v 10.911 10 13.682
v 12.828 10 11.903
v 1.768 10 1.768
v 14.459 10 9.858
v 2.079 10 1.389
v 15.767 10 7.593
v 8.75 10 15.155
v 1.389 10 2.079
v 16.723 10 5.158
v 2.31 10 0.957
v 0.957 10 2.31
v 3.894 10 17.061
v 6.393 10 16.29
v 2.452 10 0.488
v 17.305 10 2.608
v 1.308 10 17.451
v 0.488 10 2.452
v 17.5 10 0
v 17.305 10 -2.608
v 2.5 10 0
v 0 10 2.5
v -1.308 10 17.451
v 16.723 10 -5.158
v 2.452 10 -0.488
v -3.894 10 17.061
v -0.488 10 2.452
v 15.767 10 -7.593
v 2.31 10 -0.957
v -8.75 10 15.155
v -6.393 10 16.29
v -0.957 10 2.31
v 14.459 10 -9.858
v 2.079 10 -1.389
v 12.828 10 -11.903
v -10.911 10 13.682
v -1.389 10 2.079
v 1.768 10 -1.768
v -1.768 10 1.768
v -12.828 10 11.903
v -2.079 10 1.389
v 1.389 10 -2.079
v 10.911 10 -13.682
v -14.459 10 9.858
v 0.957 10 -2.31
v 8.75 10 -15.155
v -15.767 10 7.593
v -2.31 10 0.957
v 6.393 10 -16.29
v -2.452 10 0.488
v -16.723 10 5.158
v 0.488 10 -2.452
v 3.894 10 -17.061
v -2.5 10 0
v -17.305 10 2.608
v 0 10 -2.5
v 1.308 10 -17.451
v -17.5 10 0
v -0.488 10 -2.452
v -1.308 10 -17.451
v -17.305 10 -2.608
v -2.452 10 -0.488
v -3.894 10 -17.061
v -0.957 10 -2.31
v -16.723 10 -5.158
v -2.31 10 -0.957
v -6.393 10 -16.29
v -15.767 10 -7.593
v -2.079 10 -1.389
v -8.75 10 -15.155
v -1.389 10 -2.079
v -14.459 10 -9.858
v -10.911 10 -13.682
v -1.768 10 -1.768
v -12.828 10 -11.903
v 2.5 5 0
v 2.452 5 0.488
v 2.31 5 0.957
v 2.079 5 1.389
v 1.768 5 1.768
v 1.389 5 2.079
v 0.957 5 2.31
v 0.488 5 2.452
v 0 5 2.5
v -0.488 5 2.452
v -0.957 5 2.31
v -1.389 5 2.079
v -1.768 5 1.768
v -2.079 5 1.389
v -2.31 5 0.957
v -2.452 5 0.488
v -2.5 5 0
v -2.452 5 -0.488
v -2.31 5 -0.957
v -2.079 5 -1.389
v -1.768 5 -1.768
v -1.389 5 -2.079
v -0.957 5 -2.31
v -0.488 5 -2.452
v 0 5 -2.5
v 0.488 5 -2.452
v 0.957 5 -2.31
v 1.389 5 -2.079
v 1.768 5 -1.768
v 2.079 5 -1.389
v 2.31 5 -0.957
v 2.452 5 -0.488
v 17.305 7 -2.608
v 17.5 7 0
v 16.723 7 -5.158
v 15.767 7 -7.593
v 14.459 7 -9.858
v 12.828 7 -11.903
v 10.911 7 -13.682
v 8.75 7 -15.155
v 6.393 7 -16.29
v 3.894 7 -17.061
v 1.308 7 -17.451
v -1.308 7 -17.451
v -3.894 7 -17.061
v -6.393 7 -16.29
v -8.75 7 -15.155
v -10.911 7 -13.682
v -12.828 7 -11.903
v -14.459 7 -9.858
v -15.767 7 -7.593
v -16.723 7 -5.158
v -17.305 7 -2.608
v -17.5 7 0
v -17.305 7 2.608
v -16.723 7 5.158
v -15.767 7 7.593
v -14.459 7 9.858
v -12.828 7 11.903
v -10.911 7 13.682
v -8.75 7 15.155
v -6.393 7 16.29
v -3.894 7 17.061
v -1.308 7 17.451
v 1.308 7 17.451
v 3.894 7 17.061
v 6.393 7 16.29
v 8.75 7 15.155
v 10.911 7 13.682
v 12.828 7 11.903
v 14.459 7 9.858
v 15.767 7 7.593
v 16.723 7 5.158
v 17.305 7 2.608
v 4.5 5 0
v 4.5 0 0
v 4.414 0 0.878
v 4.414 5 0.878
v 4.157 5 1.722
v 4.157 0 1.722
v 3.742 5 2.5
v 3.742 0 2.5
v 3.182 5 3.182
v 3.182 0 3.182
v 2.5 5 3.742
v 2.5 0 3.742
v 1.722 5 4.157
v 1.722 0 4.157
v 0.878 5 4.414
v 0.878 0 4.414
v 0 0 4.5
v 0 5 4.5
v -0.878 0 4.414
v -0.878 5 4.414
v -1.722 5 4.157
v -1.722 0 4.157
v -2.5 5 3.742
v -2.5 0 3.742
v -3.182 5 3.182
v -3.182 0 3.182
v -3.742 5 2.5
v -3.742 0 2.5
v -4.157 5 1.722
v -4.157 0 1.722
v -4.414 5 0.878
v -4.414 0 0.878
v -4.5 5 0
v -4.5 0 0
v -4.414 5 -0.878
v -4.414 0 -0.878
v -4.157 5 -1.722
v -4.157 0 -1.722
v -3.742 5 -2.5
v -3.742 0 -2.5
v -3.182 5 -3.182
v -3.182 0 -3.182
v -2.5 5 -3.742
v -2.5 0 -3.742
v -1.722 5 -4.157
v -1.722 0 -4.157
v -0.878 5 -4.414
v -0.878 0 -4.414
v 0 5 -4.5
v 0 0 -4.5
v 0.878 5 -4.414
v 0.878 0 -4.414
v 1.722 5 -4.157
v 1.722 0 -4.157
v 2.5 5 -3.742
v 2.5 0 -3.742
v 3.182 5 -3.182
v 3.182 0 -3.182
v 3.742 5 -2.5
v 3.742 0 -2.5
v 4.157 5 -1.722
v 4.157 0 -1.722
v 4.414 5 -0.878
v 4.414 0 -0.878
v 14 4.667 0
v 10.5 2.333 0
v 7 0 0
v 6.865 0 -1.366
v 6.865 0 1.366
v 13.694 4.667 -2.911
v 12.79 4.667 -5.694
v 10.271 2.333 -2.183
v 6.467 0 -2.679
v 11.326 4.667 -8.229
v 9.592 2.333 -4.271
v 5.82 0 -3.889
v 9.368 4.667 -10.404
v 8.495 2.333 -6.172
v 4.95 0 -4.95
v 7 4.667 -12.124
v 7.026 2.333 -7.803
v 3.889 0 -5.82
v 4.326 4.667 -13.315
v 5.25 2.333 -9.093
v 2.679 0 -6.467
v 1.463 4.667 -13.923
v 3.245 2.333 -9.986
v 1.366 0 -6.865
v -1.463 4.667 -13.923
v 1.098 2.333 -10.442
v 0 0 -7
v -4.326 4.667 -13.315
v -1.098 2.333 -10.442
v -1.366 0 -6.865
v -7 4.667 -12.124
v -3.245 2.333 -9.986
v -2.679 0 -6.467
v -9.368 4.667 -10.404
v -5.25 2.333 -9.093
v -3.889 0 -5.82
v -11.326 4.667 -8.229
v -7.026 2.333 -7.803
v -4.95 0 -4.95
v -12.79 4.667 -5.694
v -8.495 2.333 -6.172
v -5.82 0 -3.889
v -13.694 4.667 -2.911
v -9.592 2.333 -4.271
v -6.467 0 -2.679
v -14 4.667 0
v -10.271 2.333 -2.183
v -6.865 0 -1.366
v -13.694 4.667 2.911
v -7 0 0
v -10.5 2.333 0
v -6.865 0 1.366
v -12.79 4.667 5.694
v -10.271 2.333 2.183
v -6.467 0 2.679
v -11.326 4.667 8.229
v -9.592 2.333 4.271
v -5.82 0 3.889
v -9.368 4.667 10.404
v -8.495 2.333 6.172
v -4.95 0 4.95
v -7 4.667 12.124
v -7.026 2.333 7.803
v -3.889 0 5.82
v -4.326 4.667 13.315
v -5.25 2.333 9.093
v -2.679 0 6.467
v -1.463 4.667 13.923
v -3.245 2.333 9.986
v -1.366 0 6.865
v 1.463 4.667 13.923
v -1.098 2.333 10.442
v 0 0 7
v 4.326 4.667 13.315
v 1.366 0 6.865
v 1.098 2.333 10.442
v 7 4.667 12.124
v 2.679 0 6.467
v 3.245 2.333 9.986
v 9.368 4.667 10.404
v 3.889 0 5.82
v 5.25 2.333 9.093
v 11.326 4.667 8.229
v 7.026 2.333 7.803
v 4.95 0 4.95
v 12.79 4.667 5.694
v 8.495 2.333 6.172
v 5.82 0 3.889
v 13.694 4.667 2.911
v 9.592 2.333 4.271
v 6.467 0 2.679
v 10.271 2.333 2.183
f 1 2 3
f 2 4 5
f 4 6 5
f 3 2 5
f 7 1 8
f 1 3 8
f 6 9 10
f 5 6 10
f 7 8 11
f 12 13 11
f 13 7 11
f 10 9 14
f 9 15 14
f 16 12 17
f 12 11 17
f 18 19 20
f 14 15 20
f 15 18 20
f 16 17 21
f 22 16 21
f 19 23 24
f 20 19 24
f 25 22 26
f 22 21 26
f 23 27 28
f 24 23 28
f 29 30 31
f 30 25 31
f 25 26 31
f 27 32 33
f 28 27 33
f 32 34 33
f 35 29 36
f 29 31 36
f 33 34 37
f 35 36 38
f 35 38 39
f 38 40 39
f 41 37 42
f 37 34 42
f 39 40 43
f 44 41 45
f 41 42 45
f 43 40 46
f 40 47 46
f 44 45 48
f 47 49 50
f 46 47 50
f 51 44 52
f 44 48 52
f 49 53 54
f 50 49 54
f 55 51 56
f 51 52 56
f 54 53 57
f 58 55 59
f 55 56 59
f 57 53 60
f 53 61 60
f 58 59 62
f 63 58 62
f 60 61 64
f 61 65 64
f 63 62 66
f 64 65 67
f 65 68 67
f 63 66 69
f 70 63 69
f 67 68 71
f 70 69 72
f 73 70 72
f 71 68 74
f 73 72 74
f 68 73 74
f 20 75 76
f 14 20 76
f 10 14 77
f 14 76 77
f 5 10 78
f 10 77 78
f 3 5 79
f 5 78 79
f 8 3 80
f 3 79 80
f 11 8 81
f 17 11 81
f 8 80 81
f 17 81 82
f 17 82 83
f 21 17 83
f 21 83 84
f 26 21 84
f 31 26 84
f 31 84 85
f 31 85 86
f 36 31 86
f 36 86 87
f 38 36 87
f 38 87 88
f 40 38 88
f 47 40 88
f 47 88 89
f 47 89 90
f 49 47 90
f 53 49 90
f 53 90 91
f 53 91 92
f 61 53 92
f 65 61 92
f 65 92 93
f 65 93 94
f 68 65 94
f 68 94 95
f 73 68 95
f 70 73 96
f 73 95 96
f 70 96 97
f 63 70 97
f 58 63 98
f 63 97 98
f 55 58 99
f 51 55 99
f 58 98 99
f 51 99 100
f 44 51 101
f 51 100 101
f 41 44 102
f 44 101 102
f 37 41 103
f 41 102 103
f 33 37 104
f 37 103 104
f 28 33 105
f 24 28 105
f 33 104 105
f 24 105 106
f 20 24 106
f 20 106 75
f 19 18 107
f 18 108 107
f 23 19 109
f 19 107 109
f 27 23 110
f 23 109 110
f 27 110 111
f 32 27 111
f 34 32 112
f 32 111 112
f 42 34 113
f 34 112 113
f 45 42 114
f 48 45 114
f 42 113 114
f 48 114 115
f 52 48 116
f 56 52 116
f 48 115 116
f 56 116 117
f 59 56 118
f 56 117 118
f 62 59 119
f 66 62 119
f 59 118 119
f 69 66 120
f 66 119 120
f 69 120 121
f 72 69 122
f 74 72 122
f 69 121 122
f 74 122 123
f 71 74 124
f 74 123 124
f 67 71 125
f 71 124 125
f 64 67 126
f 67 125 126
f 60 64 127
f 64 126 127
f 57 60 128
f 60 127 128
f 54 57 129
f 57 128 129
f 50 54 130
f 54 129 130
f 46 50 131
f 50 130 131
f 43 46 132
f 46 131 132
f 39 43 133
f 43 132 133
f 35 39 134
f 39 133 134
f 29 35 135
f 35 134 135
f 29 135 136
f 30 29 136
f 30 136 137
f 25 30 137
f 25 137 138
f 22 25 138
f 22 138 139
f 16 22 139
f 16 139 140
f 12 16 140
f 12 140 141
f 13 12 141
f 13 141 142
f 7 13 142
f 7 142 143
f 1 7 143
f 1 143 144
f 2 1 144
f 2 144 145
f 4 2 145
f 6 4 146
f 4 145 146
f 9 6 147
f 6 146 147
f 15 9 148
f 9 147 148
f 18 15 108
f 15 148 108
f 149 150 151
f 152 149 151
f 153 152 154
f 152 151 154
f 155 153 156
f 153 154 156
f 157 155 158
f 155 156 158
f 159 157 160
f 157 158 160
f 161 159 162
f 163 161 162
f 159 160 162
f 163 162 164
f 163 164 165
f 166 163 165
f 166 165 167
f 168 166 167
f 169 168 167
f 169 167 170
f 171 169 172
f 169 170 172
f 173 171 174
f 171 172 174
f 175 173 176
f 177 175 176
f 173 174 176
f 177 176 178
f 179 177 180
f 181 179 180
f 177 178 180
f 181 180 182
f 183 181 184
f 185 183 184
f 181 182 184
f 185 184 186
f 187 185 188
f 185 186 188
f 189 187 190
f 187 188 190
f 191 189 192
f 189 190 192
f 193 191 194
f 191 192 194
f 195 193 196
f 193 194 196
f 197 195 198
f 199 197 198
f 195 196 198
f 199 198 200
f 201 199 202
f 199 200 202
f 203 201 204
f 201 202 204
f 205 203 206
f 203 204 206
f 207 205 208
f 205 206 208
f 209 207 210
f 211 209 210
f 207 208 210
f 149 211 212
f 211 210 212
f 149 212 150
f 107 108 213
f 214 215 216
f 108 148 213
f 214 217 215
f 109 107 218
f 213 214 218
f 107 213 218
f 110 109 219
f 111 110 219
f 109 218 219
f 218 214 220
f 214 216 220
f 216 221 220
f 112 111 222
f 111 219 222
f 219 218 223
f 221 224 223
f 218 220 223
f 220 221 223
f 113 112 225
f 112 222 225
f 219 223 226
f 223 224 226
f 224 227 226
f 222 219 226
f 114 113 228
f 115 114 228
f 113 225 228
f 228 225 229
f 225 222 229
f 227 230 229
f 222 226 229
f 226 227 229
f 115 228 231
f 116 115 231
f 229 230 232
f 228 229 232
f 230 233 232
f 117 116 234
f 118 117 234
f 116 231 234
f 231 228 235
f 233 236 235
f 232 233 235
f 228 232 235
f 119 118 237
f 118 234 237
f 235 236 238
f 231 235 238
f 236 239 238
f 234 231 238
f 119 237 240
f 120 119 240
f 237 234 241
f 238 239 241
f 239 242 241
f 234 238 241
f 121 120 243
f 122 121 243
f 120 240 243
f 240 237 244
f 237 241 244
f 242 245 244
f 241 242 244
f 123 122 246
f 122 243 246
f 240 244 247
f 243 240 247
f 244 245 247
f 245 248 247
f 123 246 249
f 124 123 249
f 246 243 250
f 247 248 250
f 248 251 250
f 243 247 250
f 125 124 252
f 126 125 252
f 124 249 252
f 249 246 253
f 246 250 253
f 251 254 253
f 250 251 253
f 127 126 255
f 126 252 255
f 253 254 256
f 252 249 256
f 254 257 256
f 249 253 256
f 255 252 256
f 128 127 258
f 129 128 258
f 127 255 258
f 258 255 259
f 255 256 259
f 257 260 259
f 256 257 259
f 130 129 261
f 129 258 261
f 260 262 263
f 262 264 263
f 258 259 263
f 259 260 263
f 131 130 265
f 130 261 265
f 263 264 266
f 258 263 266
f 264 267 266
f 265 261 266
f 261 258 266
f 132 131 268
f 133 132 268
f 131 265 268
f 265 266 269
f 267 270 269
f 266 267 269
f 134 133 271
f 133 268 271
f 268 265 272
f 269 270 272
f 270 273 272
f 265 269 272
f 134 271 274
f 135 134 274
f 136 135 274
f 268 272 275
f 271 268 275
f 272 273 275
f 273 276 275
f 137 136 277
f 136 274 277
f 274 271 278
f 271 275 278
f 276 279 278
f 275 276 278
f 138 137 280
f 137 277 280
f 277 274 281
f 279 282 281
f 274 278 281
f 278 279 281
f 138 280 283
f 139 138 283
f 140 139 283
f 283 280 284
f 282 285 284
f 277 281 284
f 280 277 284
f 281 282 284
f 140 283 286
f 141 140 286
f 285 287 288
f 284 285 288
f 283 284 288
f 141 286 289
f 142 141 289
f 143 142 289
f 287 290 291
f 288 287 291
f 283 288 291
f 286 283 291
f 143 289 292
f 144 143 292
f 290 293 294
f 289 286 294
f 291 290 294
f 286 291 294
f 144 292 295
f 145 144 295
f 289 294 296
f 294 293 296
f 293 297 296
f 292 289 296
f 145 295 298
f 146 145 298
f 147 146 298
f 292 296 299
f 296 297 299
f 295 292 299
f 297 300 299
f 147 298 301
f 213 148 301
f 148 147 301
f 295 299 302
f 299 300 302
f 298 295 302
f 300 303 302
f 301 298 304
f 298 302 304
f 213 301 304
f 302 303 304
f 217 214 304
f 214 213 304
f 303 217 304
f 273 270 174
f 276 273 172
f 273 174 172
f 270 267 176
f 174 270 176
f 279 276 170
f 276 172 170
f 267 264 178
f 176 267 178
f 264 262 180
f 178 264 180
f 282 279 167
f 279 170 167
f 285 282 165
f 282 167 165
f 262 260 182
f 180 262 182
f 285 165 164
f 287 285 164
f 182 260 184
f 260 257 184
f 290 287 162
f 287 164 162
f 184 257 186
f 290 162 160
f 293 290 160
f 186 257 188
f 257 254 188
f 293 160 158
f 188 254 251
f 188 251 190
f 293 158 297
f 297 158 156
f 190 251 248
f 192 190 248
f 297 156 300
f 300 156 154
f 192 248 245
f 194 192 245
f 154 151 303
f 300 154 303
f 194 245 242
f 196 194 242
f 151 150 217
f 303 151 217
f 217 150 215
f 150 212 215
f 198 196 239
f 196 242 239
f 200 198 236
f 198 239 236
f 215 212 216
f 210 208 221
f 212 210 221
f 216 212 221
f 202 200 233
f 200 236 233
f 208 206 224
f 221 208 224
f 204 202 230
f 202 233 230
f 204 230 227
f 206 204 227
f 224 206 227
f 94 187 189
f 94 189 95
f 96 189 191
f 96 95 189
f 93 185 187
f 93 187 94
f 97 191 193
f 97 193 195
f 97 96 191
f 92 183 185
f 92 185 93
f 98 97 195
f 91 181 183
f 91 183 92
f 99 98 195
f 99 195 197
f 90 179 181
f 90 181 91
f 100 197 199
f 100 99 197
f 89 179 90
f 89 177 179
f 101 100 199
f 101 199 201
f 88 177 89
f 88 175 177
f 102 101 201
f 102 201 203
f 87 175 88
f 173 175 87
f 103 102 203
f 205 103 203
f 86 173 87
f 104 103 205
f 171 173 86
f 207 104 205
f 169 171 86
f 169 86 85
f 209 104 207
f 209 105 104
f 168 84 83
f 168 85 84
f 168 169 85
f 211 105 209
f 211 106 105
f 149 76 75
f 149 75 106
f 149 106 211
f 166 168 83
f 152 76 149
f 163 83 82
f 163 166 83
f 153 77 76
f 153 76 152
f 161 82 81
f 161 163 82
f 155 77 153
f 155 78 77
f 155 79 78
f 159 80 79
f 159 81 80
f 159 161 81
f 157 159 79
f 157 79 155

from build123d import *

# Parameters (mm, degrees)
SKETCH10_R         = 2.5
CUT_EXTRUDE1_DEPTH = 11
SKETCH11_R         = 4.5
CUT_EXTRUDE2_DEPTH = 5


with BuildPart() as part:
    # Sketch1 → Revolve1 (revolve)
    with BuildSketch(Plane.XY):
        Polygon((0, 0), (0, 10), (17.5, 10), (17.5, 7), (7, 0), align=None)
    revolve(axis=Axis((0, 0, 0), (0, 1, 0)))

    # Sketch10 → Cut-Extrude1 (cut, through all)
    with BuildSketch(Plane.XZ):
        Circle(SKETCH10_R)
    extrude(amount=-CUT_EXTRUDE1_DEPTH, mode=Mode.SUBTRACT)

    # Sketch11 → Cut-Extrude2 (cut)
    with BuildSketch(Plane.XZ):
        Circle(SKETCH11_R)
    extrude(amount=-CUT_EXTRUDE2_DEPTH, mode=Mode.SUBTRACT)


solid = part.part
